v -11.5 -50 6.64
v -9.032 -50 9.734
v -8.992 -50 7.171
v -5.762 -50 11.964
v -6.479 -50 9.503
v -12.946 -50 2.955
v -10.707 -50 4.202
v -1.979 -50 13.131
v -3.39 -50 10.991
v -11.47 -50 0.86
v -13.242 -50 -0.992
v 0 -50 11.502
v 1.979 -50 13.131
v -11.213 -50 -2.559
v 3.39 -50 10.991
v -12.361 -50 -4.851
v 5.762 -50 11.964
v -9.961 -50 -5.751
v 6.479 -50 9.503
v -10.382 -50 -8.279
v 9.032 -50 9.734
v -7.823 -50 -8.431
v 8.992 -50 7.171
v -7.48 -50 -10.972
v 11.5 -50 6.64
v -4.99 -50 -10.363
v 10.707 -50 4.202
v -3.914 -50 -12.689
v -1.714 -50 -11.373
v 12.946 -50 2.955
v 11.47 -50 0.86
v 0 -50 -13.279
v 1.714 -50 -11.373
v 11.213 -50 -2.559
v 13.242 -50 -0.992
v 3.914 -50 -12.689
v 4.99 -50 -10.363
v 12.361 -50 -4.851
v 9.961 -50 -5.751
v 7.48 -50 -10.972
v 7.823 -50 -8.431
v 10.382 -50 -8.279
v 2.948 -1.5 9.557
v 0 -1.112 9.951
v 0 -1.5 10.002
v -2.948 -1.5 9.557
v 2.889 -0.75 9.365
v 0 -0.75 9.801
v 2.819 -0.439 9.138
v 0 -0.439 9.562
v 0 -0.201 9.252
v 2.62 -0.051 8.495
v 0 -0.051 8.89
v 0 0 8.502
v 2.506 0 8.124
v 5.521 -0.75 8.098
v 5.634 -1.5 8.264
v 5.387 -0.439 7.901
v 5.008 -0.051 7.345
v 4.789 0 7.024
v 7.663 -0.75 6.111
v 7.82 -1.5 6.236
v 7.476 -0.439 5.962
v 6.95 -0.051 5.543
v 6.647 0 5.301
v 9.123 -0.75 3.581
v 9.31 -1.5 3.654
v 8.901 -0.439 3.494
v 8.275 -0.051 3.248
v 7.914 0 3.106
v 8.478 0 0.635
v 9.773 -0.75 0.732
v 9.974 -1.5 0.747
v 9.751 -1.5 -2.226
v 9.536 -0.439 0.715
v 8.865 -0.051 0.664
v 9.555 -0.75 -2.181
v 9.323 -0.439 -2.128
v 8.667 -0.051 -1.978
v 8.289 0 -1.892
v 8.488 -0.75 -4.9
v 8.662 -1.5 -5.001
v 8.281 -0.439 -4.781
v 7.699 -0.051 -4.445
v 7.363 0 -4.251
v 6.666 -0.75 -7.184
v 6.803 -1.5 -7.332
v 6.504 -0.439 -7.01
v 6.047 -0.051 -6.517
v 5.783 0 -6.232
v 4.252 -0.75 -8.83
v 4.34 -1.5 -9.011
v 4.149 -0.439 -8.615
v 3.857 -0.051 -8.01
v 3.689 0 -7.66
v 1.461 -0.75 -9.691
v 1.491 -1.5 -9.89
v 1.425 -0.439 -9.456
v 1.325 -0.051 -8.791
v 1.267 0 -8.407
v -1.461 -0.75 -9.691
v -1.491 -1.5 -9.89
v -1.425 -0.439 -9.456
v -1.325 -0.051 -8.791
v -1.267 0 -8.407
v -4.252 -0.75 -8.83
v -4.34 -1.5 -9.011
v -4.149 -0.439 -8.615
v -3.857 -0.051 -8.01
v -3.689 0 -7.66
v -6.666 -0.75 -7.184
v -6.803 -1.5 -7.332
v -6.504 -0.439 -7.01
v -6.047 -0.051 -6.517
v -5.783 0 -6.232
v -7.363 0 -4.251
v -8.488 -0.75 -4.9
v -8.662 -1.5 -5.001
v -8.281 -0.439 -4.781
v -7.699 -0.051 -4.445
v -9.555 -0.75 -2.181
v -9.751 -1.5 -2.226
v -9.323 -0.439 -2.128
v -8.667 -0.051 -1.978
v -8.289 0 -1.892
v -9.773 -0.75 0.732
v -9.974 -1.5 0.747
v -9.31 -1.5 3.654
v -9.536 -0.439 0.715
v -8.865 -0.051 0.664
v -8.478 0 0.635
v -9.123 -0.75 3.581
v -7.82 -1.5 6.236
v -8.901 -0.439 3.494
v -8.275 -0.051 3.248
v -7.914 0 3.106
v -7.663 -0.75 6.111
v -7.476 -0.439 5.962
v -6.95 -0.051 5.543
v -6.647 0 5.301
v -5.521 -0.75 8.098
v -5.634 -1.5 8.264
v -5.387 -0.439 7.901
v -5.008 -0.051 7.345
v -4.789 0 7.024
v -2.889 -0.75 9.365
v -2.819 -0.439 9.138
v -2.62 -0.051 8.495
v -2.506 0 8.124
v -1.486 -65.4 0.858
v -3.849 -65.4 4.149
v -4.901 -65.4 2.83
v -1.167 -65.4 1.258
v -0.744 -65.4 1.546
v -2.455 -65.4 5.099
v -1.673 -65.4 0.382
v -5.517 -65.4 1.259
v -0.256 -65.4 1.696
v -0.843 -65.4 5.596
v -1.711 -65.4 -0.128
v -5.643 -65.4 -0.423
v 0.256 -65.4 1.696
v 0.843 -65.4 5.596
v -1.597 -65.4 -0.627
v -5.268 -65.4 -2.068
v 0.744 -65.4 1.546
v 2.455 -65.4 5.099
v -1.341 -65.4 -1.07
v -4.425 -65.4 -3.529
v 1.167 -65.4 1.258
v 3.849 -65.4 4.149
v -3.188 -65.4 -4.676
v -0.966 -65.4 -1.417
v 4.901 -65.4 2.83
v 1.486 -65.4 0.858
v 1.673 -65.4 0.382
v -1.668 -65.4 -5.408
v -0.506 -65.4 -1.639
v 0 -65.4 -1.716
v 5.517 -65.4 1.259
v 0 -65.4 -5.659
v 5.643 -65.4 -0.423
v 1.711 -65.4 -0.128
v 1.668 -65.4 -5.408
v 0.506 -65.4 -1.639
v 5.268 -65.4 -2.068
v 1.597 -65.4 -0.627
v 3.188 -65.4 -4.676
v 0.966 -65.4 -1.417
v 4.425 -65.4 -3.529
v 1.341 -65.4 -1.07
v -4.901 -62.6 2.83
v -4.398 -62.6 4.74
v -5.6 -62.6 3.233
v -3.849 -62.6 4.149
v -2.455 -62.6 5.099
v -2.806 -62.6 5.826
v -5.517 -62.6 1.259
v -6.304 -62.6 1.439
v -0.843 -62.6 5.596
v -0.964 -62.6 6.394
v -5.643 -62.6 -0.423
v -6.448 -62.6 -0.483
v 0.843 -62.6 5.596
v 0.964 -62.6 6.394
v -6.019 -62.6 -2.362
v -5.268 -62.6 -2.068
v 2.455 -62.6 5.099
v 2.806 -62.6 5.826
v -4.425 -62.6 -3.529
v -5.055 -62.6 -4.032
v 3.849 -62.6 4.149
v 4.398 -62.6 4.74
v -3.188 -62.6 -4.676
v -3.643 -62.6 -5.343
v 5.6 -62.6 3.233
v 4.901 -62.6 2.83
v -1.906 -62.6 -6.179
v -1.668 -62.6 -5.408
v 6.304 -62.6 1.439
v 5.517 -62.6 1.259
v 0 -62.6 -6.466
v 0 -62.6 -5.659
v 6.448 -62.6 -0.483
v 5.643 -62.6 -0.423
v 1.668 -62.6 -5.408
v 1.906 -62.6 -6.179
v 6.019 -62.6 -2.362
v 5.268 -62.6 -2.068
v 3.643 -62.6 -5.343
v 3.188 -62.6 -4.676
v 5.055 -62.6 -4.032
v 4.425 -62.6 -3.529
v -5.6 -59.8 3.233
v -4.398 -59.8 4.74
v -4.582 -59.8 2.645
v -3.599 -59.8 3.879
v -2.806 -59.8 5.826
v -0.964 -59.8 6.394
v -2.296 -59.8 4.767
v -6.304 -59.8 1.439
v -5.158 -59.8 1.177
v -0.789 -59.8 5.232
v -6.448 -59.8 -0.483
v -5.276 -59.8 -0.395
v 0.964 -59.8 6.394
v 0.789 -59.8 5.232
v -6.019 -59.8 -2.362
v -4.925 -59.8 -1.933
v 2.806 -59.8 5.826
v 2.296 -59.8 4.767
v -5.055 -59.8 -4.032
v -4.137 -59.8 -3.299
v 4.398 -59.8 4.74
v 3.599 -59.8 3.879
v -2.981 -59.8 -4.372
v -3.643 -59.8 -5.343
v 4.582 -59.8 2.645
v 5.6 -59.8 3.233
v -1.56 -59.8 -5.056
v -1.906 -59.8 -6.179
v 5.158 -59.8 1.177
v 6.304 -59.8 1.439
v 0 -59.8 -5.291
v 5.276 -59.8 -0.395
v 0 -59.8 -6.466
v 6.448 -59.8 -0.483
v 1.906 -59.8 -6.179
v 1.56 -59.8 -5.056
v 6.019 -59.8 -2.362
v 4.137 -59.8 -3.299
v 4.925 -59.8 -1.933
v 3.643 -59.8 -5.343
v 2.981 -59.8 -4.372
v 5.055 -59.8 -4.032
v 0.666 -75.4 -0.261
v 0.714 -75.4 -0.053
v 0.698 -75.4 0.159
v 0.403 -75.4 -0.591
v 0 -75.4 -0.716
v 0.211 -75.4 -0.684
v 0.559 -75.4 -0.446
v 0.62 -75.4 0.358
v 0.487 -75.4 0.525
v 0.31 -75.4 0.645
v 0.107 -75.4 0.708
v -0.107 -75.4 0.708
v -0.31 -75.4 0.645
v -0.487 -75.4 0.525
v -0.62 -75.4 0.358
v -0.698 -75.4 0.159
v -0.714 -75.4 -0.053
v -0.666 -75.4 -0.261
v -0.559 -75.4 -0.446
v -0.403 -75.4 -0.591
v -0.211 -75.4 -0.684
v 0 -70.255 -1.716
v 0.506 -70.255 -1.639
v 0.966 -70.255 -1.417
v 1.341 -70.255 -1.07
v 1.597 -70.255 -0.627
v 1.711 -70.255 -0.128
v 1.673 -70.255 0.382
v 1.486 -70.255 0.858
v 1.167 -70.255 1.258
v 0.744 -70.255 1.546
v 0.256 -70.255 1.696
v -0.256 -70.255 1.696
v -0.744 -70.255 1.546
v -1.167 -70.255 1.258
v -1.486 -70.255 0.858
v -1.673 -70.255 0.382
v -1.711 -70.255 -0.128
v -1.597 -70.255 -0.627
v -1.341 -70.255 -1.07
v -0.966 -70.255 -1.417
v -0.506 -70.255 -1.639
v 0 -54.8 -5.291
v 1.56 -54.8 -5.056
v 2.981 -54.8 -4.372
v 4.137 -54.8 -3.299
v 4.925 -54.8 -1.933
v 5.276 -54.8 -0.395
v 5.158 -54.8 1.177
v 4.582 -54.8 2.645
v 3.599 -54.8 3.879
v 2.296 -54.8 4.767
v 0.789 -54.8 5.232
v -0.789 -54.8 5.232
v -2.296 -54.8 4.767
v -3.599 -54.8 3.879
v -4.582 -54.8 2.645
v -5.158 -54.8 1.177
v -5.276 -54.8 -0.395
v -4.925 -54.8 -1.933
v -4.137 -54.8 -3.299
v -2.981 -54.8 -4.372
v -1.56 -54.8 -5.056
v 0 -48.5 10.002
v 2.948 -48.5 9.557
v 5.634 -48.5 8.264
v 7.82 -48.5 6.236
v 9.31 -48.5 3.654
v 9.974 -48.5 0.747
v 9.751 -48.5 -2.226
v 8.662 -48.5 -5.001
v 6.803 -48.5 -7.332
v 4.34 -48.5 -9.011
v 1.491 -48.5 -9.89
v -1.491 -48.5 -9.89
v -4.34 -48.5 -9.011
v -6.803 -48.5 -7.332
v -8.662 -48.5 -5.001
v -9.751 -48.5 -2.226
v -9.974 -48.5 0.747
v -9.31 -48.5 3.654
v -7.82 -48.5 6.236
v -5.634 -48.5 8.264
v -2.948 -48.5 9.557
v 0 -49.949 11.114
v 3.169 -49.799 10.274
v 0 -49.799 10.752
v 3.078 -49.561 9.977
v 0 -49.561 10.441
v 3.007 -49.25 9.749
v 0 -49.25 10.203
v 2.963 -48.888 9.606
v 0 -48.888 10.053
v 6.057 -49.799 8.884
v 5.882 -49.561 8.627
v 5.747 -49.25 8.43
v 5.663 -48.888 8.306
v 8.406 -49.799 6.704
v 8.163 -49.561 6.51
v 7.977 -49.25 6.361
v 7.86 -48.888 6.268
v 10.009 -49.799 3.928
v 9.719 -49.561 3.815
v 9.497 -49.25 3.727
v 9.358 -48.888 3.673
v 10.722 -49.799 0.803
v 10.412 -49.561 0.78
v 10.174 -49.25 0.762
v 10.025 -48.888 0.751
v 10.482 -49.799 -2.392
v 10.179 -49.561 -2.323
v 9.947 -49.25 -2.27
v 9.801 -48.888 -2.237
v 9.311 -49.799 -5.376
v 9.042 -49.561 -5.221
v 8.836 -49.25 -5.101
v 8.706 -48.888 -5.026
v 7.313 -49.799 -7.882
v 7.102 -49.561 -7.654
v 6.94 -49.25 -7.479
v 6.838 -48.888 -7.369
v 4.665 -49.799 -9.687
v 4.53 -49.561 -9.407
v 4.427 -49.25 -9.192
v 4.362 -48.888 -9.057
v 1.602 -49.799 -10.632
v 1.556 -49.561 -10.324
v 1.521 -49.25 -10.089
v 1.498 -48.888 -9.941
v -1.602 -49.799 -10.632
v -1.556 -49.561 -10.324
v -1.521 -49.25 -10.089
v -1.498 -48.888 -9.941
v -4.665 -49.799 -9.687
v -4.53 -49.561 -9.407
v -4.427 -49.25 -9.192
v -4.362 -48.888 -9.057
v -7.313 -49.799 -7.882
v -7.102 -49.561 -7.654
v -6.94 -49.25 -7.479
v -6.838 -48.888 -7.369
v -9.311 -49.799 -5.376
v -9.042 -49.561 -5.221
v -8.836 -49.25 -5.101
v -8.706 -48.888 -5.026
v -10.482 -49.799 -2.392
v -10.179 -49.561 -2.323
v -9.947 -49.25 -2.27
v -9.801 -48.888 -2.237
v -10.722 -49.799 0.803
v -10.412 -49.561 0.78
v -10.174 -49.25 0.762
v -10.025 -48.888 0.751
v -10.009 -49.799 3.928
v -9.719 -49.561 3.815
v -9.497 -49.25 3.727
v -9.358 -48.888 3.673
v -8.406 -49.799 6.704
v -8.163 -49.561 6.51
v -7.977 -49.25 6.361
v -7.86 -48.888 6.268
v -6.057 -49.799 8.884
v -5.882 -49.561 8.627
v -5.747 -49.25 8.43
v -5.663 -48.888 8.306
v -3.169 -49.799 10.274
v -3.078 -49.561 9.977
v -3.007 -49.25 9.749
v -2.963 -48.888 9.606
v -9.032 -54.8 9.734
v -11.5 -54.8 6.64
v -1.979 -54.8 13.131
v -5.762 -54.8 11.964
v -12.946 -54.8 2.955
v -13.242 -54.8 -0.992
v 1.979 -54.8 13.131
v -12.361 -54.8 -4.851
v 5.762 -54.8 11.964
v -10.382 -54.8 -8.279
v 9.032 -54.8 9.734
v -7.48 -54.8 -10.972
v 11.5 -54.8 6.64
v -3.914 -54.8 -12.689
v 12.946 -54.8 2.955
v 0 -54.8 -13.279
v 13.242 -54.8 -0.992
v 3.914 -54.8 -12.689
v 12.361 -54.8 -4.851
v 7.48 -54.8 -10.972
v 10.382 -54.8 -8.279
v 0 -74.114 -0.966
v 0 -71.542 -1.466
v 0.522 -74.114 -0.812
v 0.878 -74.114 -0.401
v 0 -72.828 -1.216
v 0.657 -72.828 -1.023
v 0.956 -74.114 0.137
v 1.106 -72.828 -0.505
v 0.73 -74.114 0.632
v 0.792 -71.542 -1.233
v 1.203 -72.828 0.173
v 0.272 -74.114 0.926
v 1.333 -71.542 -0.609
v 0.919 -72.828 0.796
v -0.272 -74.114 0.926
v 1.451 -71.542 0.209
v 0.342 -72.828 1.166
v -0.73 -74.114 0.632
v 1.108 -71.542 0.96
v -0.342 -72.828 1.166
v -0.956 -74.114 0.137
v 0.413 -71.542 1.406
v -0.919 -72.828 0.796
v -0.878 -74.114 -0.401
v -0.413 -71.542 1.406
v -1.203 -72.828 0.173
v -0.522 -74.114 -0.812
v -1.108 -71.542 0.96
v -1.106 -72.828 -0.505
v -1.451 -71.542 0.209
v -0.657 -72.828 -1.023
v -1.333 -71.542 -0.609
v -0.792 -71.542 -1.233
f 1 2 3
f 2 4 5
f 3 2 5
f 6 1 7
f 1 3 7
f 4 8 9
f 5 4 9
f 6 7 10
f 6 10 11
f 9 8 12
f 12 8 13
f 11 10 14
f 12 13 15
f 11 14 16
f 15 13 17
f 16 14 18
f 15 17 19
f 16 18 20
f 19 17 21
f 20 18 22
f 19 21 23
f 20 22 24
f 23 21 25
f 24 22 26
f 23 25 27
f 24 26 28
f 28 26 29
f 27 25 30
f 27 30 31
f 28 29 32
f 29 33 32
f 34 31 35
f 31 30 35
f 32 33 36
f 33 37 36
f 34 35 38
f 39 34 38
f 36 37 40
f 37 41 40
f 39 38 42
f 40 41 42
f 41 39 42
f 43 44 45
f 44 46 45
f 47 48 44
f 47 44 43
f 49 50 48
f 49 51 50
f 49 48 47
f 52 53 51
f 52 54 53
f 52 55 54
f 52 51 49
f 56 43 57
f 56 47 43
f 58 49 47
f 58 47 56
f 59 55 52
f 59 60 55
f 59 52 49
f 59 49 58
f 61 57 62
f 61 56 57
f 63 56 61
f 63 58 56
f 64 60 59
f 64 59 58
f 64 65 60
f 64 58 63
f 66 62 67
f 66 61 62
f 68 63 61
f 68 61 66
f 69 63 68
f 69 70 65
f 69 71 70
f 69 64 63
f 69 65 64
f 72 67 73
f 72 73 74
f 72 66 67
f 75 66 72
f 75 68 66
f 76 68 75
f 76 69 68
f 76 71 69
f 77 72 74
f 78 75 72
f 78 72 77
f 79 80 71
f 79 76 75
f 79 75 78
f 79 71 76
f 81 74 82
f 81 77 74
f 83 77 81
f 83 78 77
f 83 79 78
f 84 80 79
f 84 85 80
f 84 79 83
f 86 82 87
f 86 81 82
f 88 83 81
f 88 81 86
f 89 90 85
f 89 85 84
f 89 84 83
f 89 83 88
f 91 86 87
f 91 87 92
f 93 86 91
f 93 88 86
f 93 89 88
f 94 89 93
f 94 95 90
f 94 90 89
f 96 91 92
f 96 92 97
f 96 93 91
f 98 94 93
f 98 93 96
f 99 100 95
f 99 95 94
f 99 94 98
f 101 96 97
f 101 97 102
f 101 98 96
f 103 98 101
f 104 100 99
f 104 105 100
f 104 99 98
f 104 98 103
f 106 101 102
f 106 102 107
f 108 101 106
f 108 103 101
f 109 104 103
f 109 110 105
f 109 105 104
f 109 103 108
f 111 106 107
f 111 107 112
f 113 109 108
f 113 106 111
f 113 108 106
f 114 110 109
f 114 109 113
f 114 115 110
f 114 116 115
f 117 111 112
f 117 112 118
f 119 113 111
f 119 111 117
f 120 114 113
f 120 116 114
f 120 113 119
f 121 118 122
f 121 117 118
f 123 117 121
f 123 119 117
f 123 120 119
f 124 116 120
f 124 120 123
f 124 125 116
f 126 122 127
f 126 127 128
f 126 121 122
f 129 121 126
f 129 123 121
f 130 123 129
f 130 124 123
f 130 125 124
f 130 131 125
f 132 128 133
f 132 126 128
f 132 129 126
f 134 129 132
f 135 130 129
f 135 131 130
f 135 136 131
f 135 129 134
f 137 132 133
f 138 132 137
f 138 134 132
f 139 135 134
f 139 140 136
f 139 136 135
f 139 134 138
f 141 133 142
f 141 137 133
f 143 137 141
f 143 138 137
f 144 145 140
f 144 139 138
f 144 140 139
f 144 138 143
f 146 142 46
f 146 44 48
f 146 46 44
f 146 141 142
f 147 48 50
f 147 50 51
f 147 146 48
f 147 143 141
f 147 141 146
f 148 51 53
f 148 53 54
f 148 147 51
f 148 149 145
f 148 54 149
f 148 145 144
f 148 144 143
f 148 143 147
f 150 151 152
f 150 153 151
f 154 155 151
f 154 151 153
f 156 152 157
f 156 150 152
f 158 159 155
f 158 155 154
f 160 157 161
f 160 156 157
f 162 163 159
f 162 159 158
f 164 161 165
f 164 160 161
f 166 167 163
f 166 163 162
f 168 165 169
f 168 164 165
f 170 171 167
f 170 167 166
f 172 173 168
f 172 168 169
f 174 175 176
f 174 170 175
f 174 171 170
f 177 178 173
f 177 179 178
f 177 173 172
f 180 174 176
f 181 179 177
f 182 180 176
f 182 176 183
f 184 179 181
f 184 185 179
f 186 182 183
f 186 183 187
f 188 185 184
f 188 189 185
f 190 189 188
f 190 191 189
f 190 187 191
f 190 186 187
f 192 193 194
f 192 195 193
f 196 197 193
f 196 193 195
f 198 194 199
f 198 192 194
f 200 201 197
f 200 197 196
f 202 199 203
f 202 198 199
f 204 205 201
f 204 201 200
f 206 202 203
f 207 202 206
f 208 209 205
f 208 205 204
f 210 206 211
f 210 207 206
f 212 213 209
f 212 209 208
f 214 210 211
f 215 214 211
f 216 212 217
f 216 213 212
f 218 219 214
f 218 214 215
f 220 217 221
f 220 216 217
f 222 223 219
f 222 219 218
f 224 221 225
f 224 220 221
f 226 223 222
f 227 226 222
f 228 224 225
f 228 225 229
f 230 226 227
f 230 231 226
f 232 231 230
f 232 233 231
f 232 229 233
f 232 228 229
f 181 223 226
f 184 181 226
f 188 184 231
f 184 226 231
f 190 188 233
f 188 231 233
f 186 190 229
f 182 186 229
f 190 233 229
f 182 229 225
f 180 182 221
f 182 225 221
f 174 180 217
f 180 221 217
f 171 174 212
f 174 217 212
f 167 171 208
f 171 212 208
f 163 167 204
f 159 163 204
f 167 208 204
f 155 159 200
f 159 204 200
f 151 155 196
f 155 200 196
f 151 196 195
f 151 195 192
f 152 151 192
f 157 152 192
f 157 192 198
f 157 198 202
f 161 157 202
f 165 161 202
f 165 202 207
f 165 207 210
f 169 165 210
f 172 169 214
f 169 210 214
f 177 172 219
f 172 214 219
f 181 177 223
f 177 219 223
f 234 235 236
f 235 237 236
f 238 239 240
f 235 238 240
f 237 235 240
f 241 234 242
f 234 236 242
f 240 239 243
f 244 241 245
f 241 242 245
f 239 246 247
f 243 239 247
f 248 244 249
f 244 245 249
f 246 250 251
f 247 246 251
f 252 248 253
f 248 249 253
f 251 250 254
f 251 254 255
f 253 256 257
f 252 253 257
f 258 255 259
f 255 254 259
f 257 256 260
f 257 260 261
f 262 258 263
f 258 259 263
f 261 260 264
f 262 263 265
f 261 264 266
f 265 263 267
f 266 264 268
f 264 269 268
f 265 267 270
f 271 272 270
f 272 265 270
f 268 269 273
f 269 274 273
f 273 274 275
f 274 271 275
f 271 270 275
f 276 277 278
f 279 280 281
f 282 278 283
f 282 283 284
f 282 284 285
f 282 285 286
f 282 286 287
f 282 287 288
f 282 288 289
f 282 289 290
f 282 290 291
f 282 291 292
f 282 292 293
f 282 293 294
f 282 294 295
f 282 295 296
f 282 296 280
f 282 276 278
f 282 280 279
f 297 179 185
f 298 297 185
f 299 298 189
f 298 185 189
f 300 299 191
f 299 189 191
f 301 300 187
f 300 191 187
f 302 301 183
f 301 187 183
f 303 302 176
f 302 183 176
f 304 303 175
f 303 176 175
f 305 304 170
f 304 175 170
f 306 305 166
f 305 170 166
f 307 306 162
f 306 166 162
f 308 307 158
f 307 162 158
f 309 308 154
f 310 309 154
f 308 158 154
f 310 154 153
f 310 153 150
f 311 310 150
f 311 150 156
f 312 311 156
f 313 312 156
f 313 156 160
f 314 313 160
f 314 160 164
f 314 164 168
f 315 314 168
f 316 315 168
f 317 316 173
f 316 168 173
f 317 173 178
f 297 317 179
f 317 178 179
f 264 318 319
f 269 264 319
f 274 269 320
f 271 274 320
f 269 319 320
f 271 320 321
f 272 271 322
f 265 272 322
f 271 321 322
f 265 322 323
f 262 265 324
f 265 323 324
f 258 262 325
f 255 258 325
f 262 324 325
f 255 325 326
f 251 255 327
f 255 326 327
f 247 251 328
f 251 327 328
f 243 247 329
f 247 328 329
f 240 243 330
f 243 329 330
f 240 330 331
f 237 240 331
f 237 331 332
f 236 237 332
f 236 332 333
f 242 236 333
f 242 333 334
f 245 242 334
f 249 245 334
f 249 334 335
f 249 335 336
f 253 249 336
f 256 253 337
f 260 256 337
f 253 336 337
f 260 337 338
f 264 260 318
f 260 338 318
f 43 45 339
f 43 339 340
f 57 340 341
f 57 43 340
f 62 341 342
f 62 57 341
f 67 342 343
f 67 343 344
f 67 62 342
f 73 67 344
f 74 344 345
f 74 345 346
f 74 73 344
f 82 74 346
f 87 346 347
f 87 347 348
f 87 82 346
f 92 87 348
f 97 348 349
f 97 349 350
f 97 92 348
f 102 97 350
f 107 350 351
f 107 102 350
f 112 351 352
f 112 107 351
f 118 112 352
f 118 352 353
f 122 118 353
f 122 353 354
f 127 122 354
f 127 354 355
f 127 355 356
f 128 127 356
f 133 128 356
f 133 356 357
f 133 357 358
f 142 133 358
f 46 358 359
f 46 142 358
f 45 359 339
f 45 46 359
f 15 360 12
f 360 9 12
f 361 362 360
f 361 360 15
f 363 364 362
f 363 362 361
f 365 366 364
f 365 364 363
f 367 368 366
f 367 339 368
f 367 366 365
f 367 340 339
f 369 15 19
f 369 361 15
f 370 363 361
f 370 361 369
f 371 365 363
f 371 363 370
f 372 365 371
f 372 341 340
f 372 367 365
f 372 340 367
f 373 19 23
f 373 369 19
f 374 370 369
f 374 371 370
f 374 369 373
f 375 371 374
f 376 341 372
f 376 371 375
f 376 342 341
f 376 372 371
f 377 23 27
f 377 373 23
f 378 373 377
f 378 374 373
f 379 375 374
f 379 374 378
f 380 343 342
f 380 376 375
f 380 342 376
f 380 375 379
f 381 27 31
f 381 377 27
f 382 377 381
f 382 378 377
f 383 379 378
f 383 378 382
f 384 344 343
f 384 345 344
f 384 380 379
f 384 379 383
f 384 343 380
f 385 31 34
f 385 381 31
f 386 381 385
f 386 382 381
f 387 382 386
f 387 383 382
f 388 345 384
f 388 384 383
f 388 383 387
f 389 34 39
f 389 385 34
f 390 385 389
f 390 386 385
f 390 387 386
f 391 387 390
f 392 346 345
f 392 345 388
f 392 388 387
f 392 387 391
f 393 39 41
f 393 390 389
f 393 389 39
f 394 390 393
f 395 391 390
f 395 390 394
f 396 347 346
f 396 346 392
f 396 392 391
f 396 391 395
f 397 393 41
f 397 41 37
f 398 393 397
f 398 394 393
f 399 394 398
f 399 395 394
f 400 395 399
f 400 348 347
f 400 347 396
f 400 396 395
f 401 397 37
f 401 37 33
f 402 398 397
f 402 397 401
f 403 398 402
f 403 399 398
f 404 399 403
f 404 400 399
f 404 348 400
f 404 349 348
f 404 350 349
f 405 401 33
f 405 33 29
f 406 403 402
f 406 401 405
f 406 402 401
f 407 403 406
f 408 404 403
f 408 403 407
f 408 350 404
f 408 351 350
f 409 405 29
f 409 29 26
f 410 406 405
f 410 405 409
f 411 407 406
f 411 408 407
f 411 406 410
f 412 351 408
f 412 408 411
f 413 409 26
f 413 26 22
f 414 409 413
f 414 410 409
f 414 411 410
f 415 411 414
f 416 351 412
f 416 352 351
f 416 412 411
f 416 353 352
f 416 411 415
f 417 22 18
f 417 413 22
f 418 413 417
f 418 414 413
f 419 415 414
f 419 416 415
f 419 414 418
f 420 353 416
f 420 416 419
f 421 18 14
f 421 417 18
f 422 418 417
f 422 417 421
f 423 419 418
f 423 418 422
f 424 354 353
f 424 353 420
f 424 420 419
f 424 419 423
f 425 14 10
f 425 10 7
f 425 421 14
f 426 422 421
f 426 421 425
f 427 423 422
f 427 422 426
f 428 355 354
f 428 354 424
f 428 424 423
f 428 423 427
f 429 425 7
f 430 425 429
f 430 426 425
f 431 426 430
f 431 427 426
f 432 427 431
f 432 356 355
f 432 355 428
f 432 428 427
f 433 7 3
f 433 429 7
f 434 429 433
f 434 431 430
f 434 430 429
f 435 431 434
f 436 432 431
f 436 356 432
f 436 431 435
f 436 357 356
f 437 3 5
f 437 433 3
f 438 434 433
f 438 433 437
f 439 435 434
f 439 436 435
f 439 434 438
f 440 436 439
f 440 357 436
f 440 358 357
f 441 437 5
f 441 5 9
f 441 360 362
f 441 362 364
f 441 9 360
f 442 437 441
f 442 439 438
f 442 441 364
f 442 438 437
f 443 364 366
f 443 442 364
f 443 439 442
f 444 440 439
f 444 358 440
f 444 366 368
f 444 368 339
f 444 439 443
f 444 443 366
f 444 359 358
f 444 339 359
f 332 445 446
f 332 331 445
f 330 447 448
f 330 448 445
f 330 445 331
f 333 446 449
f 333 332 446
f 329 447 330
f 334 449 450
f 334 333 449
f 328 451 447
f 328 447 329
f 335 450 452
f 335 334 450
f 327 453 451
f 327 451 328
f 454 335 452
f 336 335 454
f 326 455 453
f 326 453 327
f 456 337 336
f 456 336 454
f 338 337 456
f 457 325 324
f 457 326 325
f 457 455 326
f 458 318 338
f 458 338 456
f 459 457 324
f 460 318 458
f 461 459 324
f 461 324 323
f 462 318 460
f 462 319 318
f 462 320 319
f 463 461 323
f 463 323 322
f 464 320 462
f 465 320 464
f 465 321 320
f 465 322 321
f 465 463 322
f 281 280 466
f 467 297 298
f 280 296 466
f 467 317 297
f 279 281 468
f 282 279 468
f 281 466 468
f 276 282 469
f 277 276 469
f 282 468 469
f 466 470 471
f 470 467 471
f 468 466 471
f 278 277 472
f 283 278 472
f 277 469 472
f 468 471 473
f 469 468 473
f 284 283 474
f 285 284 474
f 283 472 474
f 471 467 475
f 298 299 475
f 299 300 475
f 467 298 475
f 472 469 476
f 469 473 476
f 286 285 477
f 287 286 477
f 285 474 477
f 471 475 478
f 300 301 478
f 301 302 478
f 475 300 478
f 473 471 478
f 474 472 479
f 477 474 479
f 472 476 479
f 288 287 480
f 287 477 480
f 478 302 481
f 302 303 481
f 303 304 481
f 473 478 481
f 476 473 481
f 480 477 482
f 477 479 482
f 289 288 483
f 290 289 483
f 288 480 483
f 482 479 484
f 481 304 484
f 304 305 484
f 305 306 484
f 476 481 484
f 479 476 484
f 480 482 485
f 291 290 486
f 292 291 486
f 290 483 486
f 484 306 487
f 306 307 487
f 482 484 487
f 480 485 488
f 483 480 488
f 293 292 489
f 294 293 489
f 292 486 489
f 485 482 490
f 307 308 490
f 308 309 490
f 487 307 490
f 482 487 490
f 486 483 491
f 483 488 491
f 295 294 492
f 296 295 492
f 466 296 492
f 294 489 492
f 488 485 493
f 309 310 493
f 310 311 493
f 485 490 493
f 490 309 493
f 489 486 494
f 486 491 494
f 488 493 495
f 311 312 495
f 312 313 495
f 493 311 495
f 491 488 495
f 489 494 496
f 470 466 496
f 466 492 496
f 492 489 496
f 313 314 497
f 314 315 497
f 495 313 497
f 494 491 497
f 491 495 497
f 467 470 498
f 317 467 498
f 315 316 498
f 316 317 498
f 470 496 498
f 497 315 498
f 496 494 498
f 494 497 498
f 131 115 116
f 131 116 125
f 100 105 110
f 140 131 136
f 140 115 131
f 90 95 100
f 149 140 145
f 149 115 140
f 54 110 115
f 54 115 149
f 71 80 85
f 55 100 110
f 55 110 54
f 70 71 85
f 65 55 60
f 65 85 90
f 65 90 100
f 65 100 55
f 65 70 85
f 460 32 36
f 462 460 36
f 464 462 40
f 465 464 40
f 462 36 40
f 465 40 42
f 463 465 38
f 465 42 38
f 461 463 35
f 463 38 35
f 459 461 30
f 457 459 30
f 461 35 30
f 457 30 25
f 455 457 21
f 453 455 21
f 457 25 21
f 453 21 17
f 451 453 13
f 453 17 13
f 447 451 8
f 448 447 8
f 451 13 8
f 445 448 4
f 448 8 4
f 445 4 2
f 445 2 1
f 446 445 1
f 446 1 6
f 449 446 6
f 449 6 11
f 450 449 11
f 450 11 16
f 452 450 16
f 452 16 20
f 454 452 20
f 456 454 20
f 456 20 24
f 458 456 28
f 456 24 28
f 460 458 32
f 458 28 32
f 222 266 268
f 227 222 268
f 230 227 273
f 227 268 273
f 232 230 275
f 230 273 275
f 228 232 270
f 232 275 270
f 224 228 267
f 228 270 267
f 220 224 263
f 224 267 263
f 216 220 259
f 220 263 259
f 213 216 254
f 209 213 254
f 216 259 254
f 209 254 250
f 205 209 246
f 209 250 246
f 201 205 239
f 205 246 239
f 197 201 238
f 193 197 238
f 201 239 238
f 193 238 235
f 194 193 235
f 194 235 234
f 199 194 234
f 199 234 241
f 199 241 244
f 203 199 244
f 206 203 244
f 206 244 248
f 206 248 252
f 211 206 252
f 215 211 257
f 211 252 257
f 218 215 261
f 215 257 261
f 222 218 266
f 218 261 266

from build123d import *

# Parameters (mm, degrees)
SKETCH1_R           = 10.00174333
BOSS_EXTRUDE3_DEPTH = 50
SKETCH4_R           = 13.27917762
BOSS_EXTRUDE4_DEPTH = 4.8
FILLET1_R           = 1.5
SKETCH5_R           = 5.290974817
BOSS_EXTRUDE5_DEPTH = 5
SKETCH6_R           = 6.466211651
BOSS_EXTRUDE6_DEPTH = 2.8
SKETCH7_R           = 5.659284008
BOSS_EXTRUDE7_DEPTH = 2.8
SKETCH8_R           = 1.715557864
BOSS_EXTRUDE8_DEPTH = 10
CHAMFER1_SIZE       = 1
CHAMFER1_SIZE2      = 5.144554016


with BuildPart() as part:
    # Sketch1 → Boss-Extrude3 (new body)
    with BuildSketch(Plane(origin=(0, 0, 0), x_dir=(1, 0, 0), z_dir=(0, 1, 0))):
        with Locations(Location((0, 0, 0), (0, 0, 270))):
            Circle(SKETCH1_R)
    extrude(amount=-BOSS_EXTRUDE3_DEPTH)

    # Sketch4 → Boss-Extrude4 (add)
    with BuildSketch(Plane.XZ.offset(50)):
        with Locations(Location((0, 0, 0), (0, 0, 270))):
            Circle(SKETCH4_R)
    extrude(amount=BOSS_EXTRUDE4_DEPTH)

    # Fillet1
    fillet1_edges = [part.edges().sort_by_distance(p)[0] for p in [
        (0, 0, -10.00174333),
        (0, -50, -10.00174333),
    ]]
    fillet(fillet1_edges, radius=FILLET1_R)

    # Sketch5 → Boss-Extrude5 (add)
    with BuildSketch(Plane(origin=(0, -54.8, 0), x_dir=(-1, 0, 0), z_dir=(0, -1, 0))):
        with Locations(Location((0, 0, 0), (0, 0, 90))):
            Circle(SKETCH5_R)
    extrude(amount=BOSS_EXTRUDE5_DEPTH)

    # Sketch6 → Boss-Extrude6 (add)
    with BuildSketch(Plane(origin=(0, -59.8, 0), x_dir=(-1, 0, 0), z_dir=(0, -1, 0))):
        with Locations(Location((0, 0, 0), (0, 0, 90))):
            Circle(SKETCH6_R)
    extrude(amount=BOSS_EXTRUDE6_DEPTH)

    # Sketch7 → Boss-Extrude7 (add)
    with BuildSketch(Plane(origin=(0, -62.6, 0), x_dir=(-1, 0, 0), z_dir=(0, -1, 0))):
        with Locations(Location((0, 0, 0), (0, 0, 90))):
            Circle(SKETCH7_R)
    extrude(amount=BOSS_EXTRUDE7_DEPTH)

    # Sketch8 → Boss-Extrude8 (add)
    with BuildSketch(Plane.XZ.offset(65.4)):
        with Locations(Location((0, 0, 0), (0, 0, 270))):
            Circle(SKETCH8_R)
    extrude(amount=BOSS_EXTRUDE8_DEPTH)

    # Chamfer1
    chamfer1_edges = [part.edges().sort_by_distance(p)[0] for p in [
        (0, -75.4, 1.715557864),
    ]]
    chamfer1_side = [part.faces().sort_by_distance(p)[0] for p in [
        (0, -75.4, 0),
    ]]
    chamfer(chamfer1_edges, length=CHAMFER1_SIZE, length2=CHAMFER1_SIZE2, reference=chamfer1_side[0])


solid = part.part
